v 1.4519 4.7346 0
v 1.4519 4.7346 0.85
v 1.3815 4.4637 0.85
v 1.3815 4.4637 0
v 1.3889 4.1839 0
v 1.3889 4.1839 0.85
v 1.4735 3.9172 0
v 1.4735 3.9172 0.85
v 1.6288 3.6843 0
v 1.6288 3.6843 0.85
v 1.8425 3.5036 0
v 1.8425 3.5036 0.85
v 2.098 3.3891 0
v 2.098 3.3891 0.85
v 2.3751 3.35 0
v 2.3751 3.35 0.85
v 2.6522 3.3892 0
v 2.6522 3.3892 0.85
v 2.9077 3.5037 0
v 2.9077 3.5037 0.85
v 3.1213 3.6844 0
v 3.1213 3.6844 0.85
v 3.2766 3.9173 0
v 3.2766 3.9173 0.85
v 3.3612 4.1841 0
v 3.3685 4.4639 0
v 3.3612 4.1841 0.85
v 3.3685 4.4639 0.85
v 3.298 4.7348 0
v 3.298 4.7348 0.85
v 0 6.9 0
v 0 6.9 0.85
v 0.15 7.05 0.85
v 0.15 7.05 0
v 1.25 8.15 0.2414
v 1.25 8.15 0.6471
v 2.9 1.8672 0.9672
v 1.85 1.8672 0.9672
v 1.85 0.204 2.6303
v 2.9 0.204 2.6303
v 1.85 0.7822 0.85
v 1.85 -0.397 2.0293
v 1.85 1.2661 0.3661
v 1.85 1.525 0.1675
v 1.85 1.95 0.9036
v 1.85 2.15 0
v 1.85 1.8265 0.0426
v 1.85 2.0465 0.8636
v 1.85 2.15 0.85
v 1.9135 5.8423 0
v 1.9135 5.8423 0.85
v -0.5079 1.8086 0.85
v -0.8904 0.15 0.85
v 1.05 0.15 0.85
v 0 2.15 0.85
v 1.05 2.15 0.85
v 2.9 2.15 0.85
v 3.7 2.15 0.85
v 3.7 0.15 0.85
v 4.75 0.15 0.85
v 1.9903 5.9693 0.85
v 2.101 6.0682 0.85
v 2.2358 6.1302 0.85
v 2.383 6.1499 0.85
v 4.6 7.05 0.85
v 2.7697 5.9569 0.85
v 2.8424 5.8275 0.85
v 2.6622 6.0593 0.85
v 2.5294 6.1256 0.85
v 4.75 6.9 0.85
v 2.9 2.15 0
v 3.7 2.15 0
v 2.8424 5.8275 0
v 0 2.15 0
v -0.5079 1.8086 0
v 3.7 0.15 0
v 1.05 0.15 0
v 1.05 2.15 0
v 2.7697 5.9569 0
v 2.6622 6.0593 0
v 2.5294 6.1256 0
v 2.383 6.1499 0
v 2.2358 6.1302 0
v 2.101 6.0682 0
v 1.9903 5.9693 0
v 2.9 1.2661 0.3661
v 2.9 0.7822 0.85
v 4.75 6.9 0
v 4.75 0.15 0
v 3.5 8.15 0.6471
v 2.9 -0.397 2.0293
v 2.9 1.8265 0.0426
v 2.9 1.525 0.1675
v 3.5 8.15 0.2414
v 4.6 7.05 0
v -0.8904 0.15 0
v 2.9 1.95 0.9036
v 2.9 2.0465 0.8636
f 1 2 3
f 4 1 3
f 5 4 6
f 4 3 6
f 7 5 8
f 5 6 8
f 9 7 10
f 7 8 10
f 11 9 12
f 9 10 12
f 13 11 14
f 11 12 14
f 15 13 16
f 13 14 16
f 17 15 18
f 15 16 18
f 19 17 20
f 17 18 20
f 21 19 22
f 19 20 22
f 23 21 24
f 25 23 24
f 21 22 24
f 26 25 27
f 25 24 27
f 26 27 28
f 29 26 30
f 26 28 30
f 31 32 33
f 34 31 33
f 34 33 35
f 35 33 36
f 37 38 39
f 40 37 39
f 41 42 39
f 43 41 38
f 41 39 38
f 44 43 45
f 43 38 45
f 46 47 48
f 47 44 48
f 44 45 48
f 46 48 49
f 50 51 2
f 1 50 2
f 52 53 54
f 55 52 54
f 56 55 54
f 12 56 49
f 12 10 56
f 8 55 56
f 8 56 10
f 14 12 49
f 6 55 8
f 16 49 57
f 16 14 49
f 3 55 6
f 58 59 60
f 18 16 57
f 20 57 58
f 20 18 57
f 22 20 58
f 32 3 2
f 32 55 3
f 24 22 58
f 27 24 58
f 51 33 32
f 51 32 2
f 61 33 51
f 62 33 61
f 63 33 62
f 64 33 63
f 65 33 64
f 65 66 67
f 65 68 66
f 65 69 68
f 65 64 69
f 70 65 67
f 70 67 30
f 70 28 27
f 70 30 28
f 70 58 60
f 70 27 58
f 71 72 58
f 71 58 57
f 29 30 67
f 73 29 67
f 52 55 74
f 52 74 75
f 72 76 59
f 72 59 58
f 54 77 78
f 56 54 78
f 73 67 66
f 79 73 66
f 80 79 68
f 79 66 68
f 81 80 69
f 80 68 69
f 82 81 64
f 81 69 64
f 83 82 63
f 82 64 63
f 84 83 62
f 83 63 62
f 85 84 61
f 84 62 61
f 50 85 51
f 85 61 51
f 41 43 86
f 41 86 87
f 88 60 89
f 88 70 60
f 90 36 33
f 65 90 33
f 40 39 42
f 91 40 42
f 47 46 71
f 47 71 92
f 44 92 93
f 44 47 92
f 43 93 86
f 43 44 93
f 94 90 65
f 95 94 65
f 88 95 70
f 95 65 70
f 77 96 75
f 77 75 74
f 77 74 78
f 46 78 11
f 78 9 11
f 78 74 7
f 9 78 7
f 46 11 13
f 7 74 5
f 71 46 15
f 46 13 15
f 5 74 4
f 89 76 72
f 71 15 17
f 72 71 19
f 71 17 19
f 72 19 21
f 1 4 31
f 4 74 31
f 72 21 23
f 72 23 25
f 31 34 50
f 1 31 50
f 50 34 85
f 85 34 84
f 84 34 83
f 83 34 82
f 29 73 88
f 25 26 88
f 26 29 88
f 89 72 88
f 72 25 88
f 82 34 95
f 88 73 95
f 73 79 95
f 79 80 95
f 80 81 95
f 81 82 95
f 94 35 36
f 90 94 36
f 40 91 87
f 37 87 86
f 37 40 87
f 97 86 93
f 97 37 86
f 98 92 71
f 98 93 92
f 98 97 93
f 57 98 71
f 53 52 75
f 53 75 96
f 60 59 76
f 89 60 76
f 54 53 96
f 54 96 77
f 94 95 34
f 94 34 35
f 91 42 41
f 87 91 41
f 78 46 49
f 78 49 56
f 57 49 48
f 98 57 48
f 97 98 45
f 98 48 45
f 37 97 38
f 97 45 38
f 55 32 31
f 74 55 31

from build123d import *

# Parameters (mm, degrees)
BOSS_EXTRUDE1_DEPTH    = 4.75
CUT_EXTRUDE1_REACH     = 11.471
CUT_EXTRUDE2_DEPTH     = 0.85
SKETCH6_W              = 0.8
SKETCH6_H              = 2
CUT_EXTRUDE3_DEPTH     = 0.85
SKETCH7_W              = 1.05
SKETCH7_H              = 0.85
BOSS_EXTRUDE2_DEPTH    = 1
SKETCHED_START         = 1.85
SKETCHED_BEND1_DEPTH   = 1.05
SKETCHED_BEND1_2_DEPTH = 1.05
BOSS_EXTRUDE3_DEPTH    = 0.85


# Read off the part's stored shape, not the designer's step: Sketched Bend1
with BuildPart() as part:
    # Sketch1 → Boss-Extrude1 (new body)
    with BuildSketch(Plane(origin=(0, 0, 0), x_dir=(0, 0, -1), z_dir=(1, 0, 0))):
        Polygon((0, 0.15), (0, 7.05), (-0.241393443, 8.15), (-0.647131148, 8.15), (-0.85, 7.05), (-0.85, 0.15), align=None)
    extrude(amount=BOSS_EXTRUDE1_DEPTH)

    # Cut-Extrude1: up to this face of the body (flat: up to its plane)
    cut_extrude1_end = Plane(part.part.faces().sort_by_distance((2.375, 3.6, 0))[0])
    # Sketch4 → Cut-Extrude1 (cut, up to the picked face)
    with BuildSketch(Plane.XY.offset(0.85), mode=Mode.PRIVATE) as cut_extrude1_sk1:
        Polygon((0, 6.9), (1.25, 8.15), (0, 8.15), align=None)
    cut_extrude1_tool1 = split(extrude(cut_extrude1_sk1.sketch, amount=-CUT_EXTRUDE1_REACH, mode=Mode.PRIVATE), bisect_by=cut_extrude1_end, keep=Keep.BOTH, mode=Mode.PRIVATE)
    # Sketch4 → Cut-Extrude1 (cut, up to the picked face)
    with BuildSketch(Plane.XY.offset(0.85), mode=Mode.PRIVATE) as cut_extrude1_sk2:
        Polygon((3.5, 8.15), (4.75, 6.9), (4.75, 8.15), align=None)
    cut_extrude1_tool2 = split(extrude(cut_extrude1_sk2.sketch, amount=-CUT_EXTRUDE1_REACH, mode=Mode.PRIVATE), bisect_by=cut_extrude1_end, keep=Keep.BOTH, mode=Mode.PRIVATE)
    add(cut_extrude1_tool1.solids().sort_by(Axis((0.416667, 7.733333, 0.85), (0, 0, -1)))[0], mode=Mode.SUBTRACT)
    add(cut_extrude1_tool2.solids().sort_by(Axis((4.333333, 7.733333, 0.85), (0, 0, -1)))[0], mode=Mode.SUBTRACT)

    # Sketch5 → Cut-Extrude2 (cut)
    with BuildSketch(Plane.XY.offset(0.85)):
        with BuildLine():
            Line((1.913461538, 5.842307692), (1.451923077, 4.734615385))
            ThreePointArc((1.451923077, 4.734615385), (2.37510742, 3.350000006), (3.297994271, 4.734813689))
            Line((3.297994271, 4.734813689), (2.842436975, 5.827489929))
            ThreePointArc((2.842436975, 5.827489929), (2.382974312, 6.149936406), (1.913461538, 5.842307692))
        make_face()
    extrude(amount=-CUT_EXTRUDE2_DEPTH, mode=Mode.SUBTRACT)

    # Sketch6 → Cut-Extrude3 (cut)
    with BuildSketch(Plane(origin=(0, 0, 0), x_dir=(-1, 0, 0), z_dir=(0, 0, -1))):
        with Locations((-3.3, 1.15)):
            Rectangle(SKETCH6_W, SKETCH6_H)
        with Locations((-1.45, 1.15)):
            Rectangle(SKETCH6_W, SKETCH6_H)
    extrude(amount=-CUT_EXTRUDE3_DEPTH, mode=Mode.SUBTRACT)

    # Sketch7 → Boss-Extrude2 (add)
    with BuildSketch(Plane.XZ.offset(-0.15)):
        with Locations((2.375, 0.425)):
            Rectangle(SKETCH7_W, SKETCH7_H)
    extrude(amount=BOSS_EXTRUDE2_DEPTH)

    # Sketched Bend1 outline → Sketched Bend1 (cut)
    with BuildSketch(Plane.YZ.offset(SKETCHED_START)):
        with BuildLine():
            Line((1.266116524, 0.366116524), (0.782233048, 0.85))
            Line((0.782233048, 0.85), (-0.85, 0.85))
            Line((-0.85, 0.85), (-0.85, 0))
            Line((-0.85, 0), (2.15, 0))
            ThreePointArc((2.15, 0), (1.67164571, 0.095150584), (1.266116524, 0.366116524))
        make_face()
    extrude(amount=SKETCHED_BEND1_DEPTH, mode=Mode.SUBTRACT)

    # Sketched Bend1 2 outline → Sketched Bend1 2 (add)
    with BuildSketch(Plane.YZ.offset(SKETCHED_START)):
        with BuildLine():
            ThreePointArc((2.15, 0.85), (1.996926627, 0.880448187), (1.867157288, 0.967157288))
            Line((1.867157288, 0.967157288), (0.204009247, 2.630305328))
            Line((0.204009247, 2.630305328), (-0.397031517, 2.029264564))
            Line((-0.397031517, 2.029264564), (0.782233048, 0.85))
            Line((0.782233048, 0.85), (2.15, 0.85))
        make_face()
    extrude(amount=SKETCHED_BEND1_2_DEPTH)

    # Sketch15 → Boss-Extrude3 (add)
    with BuildSketch(Plane.XY.offset(0.85)):
        Polygon((0, 2.15), (-0.50789834, 1.808617859), (-0.890356386, 0.15), (0, 0.15), align=None)
    extrude(amount=-BOSS_EXTRUDE3_DEPTH)


solid = part.part
